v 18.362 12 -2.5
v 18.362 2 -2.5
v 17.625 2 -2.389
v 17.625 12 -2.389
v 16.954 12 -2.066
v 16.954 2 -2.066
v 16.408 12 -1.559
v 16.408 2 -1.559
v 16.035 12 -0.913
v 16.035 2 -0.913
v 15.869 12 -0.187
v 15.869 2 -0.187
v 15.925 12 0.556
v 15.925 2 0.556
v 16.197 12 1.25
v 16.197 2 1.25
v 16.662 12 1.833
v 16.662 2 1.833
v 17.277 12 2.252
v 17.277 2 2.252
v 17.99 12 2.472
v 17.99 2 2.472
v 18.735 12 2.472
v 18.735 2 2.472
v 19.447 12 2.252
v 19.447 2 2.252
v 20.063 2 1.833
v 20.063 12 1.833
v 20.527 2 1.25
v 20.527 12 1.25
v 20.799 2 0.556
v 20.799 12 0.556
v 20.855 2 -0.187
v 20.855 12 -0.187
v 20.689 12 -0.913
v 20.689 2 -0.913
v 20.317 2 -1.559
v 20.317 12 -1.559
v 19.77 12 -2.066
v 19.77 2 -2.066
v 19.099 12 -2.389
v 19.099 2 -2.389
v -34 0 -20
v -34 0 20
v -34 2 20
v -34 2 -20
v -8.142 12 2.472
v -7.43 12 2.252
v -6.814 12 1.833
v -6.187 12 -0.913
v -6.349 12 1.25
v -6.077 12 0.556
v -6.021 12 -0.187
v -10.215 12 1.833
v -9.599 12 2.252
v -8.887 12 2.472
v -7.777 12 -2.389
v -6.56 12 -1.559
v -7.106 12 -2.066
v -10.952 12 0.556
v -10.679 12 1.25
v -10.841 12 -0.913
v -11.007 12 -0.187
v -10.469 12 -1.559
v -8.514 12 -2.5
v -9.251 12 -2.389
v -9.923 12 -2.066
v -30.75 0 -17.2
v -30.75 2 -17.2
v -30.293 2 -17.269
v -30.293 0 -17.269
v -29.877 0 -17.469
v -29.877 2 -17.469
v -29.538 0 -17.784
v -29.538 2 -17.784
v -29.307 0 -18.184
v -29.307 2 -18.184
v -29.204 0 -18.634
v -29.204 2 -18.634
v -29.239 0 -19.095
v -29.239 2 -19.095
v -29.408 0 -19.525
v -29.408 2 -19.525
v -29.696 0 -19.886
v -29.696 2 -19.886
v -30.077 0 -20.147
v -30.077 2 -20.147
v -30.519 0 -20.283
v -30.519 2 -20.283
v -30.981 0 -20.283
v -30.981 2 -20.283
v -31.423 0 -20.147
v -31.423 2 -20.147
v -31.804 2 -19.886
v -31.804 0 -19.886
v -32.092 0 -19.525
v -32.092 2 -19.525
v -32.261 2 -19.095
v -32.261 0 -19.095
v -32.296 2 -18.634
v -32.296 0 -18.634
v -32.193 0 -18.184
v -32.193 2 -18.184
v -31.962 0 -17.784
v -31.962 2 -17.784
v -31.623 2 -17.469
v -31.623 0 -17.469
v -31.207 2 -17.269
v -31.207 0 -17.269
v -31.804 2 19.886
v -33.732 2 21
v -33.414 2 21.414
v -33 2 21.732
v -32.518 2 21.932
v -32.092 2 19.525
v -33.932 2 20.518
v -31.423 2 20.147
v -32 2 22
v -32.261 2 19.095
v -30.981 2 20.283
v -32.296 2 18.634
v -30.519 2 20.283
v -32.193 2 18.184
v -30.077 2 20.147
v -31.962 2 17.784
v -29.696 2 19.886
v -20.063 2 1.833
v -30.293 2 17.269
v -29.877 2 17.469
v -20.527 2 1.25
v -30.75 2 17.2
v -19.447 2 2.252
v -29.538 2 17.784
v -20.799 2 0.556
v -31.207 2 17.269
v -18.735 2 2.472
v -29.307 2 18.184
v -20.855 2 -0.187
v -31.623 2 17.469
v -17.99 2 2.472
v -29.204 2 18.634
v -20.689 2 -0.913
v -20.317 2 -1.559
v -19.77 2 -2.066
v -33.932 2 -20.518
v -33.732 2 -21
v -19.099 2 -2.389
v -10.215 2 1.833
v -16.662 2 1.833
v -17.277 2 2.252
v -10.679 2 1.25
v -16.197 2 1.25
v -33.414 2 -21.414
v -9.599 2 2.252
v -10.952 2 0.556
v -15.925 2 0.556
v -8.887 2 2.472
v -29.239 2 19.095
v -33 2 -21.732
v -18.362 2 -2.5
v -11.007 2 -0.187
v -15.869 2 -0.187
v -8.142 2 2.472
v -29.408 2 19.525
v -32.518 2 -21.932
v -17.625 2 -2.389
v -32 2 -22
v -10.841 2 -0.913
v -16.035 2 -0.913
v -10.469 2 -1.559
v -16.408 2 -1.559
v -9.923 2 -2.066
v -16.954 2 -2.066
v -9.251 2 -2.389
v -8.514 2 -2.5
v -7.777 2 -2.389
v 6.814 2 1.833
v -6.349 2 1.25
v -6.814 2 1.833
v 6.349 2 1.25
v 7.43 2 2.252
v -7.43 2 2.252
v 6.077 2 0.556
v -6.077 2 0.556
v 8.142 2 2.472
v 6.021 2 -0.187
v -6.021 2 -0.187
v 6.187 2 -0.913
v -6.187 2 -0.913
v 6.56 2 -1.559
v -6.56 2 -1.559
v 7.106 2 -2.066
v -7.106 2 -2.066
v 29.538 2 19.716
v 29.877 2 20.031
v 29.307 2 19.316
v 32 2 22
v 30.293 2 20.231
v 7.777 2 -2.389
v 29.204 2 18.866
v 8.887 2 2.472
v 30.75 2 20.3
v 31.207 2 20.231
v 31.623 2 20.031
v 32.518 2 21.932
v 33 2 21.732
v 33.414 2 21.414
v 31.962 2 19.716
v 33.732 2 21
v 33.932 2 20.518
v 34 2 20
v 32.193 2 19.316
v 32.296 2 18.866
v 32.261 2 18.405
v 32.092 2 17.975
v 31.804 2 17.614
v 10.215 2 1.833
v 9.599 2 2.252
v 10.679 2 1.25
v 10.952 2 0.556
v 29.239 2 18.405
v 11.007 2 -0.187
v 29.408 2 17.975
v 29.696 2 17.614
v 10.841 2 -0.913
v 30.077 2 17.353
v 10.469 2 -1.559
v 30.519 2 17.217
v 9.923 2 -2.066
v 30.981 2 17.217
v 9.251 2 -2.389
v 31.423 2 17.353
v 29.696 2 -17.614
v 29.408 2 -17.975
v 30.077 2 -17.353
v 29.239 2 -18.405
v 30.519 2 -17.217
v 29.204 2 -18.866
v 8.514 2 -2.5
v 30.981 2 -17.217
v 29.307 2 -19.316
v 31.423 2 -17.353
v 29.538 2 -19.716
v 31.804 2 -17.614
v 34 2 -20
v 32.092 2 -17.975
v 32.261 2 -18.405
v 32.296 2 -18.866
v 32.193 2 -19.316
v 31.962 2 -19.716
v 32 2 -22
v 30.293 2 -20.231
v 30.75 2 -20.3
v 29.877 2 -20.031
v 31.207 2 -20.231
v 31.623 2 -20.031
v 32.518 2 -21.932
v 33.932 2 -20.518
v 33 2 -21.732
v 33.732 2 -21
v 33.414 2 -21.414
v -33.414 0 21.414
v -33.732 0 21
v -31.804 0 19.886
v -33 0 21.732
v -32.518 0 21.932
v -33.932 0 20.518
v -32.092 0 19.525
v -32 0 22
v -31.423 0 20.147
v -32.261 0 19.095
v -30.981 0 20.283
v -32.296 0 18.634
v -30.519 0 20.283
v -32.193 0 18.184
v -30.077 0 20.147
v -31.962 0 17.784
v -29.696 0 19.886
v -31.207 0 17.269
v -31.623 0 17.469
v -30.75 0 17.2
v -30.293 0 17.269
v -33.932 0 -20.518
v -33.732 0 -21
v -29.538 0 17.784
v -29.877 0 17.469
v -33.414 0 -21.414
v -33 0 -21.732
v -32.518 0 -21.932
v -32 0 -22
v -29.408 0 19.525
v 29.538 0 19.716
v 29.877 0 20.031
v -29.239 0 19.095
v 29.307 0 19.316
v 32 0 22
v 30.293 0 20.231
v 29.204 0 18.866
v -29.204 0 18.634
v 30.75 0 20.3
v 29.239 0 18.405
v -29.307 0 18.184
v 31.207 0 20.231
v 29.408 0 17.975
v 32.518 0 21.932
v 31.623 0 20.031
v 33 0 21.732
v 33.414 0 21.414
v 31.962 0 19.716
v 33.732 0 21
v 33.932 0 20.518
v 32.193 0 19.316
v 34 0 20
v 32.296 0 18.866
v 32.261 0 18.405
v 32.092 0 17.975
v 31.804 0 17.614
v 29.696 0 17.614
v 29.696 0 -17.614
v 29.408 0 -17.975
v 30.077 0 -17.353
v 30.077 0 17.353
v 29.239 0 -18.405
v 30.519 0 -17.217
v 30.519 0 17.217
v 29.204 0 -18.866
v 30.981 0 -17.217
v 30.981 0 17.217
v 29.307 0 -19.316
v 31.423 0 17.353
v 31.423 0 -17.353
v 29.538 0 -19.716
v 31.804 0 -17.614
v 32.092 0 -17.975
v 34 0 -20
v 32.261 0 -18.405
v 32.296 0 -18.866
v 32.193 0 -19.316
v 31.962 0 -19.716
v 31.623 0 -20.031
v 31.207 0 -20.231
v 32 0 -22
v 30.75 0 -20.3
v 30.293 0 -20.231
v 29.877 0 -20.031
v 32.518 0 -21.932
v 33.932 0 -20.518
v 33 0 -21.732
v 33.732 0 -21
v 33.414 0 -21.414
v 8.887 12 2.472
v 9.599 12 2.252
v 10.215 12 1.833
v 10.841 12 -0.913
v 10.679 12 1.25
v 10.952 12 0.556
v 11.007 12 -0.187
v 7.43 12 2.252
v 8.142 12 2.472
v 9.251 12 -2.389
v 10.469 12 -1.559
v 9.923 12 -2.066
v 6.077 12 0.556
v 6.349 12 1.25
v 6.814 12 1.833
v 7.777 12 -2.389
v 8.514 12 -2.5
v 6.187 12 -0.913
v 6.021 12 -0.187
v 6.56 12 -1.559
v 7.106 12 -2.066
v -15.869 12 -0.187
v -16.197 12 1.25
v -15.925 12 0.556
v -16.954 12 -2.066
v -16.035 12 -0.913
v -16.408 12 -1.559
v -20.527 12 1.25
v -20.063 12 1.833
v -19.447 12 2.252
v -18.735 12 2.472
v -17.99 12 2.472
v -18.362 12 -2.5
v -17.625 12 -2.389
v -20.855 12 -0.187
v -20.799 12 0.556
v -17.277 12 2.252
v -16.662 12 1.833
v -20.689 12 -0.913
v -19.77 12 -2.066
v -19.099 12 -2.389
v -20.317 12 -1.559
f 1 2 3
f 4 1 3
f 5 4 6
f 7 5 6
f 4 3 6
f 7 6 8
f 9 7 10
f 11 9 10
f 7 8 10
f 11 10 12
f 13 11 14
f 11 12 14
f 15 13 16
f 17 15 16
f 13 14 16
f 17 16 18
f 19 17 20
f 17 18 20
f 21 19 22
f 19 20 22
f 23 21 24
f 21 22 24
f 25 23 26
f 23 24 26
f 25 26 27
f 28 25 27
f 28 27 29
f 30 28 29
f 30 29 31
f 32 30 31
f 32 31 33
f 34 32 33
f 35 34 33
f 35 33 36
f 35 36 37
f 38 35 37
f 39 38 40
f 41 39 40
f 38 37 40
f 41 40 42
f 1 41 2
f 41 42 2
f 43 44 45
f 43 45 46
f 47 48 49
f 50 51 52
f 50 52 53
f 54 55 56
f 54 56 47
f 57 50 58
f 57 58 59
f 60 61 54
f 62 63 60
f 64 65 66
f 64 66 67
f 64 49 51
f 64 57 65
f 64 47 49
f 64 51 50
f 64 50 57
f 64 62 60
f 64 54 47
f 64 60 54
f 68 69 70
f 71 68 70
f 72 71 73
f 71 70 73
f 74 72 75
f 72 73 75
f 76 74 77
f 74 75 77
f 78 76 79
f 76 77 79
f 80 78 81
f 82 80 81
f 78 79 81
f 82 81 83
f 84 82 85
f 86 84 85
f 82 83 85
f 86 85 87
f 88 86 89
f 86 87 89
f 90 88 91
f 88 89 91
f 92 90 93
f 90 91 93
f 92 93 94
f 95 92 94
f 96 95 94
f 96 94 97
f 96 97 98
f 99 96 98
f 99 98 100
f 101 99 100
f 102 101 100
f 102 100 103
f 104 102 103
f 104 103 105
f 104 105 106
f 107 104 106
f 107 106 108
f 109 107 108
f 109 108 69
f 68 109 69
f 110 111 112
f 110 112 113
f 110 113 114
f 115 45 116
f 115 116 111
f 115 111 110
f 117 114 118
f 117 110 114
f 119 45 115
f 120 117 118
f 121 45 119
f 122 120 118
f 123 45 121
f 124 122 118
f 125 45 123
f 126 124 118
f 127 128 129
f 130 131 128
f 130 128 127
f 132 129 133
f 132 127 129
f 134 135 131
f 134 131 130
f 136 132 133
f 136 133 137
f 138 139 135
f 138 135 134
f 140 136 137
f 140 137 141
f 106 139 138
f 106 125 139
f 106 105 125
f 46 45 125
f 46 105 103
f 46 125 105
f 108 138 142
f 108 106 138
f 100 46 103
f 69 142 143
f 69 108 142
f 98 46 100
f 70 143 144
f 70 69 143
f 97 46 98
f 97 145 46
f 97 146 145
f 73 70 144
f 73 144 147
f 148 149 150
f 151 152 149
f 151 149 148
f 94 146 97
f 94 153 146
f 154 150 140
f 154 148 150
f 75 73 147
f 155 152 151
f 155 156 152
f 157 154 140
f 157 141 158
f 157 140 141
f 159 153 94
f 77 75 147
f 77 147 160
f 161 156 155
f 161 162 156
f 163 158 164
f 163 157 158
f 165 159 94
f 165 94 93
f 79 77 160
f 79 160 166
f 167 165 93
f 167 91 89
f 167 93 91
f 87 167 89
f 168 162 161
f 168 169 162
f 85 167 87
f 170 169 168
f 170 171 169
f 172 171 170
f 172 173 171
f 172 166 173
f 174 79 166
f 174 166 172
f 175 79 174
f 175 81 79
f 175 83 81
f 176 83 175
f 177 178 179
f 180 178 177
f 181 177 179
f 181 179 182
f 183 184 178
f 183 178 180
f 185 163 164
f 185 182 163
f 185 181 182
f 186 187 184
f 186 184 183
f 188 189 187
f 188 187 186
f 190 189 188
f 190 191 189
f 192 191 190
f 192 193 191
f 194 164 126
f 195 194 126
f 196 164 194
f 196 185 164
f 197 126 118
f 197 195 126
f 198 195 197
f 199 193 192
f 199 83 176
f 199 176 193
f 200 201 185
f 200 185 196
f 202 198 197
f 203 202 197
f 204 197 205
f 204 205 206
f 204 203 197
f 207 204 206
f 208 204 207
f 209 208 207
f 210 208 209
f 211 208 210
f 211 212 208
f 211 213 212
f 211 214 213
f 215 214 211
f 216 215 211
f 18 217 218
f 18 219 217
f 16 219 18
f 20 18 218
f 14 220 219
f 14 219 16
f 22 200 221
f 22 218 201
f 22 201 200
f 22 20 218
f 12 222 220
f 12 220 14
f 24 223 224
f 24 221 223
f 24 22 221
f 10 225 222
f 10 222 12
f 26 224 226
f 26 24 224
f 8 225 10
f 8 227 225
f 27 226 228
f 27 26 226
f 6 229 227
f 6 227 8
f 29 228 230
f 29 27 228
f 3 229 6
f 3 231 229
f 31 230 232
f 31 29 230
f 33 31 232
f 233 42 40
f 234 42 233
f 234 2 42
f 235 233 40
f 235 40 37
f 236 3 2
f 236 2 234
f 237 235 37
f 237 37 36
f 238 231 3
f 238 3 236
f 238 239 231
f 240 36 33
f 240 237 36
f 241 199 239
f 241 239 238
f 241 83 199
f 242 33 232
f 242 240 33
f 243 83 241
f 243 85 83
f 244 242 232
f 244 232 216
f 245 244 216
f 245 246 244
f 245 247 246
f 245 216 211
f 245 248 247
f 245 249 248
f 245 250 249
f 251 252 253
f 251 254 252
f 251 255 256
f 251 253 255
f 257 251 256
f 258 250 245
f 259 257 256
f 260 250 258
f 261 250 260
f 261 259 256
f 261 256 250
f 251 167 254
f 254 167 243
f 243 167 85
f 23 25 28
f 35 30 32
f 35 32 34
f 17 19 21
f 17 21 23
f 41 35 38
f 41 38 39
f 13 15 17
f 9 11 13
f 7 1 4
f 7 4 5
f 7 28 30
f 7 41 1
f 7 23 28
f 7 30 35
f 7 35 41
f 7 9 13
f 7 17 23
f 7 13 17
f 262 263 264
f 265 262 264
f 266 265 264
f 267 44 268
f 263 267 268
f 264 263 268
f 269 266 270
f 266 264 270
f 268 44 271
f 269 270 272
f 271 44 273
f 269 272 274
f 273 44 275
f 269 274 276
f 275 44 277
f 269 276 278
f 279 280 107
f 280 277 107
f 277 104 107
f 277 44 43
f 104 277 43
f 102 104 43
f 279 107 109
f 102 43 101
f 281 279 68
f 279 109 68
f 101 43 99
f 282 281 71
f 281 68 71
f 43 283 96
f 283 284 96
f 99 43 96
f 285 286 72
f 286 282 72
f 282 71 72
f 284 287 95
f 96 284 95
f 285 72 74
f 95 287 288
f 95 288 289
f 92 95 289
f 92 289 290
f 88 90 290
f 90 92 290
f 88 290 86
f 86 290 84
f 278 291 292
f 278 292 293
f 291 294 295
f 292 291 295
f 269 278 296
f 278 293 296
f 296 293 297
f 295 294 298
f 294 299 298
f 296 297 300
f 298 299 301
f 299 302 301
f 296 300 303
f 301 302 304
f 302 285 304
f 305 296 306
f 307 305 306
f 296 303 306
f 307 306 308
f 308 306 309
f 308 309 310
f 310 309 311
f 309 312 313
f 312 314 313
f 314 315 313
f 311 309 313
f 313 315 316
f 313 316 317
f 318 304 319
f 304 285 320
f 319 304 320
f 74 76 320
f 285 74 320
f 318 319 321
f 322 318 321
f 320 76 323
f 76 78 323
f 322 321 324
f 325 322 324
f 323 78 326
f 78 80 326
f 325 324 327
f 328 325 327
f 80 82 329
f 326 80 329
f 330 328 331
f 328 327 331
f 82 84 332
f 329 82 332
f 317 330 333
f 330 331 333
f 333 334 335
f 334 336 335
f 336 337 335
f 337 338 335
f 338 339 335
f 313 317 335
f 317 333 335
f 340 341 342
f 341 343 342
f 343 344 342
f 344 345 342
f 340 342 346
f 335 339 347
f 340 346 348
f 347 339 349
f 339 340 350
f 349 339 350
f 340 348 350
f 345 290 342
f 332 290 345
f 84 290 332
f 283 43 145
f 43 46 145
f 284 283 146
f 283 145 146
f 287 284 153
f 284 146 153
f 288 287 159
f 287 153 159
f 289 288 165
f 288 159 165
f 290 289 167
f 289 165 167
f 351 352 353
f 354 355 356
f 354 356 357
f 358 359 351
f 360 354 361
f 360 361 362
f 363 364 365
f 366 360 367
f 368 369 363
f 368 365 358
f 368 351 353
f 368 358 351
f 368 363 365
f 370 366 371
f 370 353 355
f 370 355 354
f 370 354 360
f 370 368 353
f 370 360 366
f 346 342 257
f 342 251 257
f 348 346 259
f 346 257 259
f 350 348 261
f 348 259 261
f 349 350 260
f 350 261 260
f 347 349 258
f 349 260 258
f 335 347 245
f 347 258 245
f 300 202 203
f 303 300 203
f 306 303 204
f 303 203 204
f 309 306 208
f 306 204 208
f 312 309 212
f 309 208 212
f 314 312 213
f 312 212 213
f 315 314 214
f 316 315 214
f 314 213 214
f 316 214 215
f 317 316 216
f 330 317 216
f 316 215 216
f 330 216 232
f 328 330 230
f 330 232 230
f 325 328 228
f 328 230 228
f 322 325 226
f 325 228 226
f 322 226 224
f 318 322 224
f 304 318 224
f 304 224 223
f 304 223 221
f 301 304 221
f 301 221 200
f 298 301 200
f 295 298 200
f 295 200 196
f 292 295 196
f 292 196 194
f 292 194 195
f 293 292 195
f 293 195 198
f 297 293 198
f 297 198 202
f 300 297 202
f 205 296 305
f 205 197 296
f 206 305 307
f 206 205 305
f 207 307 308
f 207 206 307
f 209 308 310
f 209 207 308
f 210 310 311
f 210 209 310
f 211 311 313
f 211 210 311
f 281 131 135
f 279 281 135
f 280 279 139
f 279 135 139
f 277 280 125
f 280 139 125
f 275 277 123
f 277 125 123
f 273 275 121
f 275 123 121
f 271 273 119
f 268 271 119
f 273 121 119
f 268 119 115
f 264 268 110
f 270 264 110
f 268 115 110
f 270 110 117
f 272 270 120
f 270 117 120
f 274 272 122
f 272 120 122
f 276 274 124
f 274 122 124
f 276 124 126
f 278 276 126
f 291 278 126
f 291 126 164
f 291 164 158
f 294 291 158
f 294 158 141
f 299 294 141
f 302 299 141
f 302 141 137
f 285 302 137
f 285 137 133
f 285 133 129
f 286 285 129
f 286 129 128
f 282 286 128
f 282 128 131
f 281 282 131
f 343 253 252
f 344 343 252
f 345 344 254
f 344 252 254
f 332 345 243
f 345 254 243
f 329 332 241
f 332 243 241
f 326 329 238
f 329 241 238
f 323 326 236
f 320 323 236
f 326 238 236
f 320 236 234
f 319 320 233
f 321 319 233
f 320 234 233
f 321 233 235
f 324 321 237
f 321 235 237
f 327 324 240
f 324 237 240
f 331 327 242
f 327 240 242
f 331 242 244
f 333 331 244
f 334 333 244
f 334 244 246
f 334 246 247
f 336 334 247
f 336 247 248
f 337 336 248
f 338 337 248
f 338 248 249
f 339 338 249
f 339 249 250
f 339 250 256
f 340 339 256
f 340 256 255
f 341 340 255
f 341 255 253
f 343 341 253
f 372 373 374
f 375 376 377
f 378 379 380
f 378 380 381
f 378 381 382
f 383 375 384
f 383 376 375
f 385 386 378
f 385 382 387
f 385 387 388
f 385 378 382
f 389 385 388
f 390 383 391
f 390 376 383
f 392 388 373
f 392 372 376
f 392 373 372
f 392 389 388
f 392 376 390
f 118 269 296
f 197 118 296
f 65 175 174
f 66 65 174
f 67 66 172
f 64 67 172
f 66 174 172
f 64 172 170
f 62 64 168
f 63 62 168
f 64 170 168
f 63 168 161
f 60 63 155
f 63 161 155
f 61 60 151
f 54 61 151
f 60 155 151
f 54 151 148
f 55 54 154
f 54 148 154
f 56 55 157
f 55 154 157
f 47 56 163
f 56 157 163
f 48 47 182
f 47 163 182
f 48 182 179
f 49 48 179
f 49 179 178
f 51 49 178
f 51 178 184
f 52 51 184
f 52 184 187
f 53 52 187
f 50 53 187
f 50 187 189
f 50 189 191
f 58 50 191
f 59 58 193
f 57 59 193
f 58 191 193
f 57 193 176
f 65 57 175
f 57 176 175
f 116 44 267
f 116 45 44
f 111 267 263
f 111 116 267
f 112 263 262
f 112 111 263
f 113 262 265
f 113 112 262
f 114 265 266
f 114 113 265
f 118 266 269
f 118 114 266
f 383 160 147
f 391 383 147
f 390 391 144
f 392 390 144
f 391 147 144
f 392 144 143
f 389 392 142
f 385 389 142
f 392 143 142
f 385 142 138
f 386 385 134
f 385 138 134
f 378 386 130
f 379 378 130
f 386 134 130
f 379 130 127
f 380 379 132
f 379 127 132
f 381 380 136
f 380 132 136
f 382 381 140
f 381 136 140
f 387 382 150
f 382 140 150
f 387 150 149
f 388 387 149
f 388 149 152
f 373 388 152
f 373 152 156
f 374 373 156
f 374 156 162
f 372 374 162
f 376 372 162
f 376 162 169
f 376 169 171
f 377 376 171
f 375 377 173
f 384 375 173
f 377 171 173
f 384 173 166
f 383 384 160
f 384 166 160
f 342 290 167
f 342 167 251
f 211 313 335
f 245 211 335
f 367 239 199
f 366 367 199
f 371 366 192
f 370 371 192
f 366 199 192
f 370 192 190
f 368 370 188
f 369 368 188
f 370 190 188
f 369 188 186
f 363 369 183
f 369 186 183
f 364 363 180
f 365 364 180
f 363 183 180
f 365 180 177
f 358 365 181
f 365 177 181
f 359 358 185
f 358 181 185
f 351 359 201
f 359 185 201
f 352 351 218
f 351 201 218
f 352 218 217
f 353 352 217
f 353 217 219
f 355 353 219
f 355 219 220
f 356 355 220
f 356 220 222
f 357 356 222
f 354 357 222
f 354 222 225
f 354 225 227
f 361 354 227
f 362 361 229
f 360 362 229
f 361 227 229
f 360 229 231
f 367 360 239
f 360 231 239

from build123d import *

# Parameters (mm, degrees)
SKETCH_1_W          = 68
SKETCH_1_H          = 44
EXTRUDE_1_DEPTH     = 2
SKETCH_2_R          = 2.5
EXTRUDE_2_DEPTH     = 10
SKETCH_4_R          = 1.55
CUT_EXTRUDE_1_DEPTH = 42.713307229
FILLET_1_R          = 2


with BuildPart() as part:
    # 草图1 → 凸台-拉伸1 (new body)
    with BuildSketch(Plane(origin=(0, 0, 0), x_dir=(1, 0, 0), z_dir=(0, 1, 0))):
        Rectangle(SKETCH_1_W, SKETCH_1_H)
    extrude(amount=EXTRUDE_1_DEPTH)

    # 草图2 → 凸台-拉伸2 (add)
    with BuildSketch(Plane(origin=(0, 2, 0), x_dir=(1, 0, 0), z_dir=(0, 1, 0))):
        with Locations(Location((-18.362121931, 0, 0), (0, 0, 90))):
            Circle(SKETCH_2_R)
        with Locations(Location((-8.514245581, 0, 0), (0, 0, 90))):
            Circle(SKETCH_2_R)
        with Locations(Location((8.514245581, 0, 0), (0, 0, 90))):
            Circle(SKETCH_2_R)
        with Locations(Location((18.362121931, 0, 0), (0, 0, 90))):
            Circle(SKETCH_2_R)
    extrude(amount=EXTRUDE_2_DEPTH)

    # 草图4 → 切除-拉伸1 (cut, through all)
    with BuildSketch(Plane(origin=(0, 2, 0), x_dir=(1, 0, 0), z_dir=(0, 1, 0))):
        with Locations(Location((-30.75, 18.75, 0), (0, 0, 270))):
            Circle(SKETCH_4_R)
        with Locations(Location((-30.75, -18.75, 0), (0, 0, 90))):
            Circle(SKETCH_4_R)
        with Locations(Location((30.75, -18.75, 0), (0, 0, 270))):
            Circle(SKETCH_4_R)
        with Locations(Location((30.75, 18.75, 0), (0, 0, 90))):
            Circle(SKETCH_4_R)
    extrude(amount=-CUT_EXTRUDE_1_DEPTH, mode=Mode.SUBTRACT)

    # 圆角1
    fillet_1_edges = [part.edges().sort_by_distance(p)[0] for p in [
        (34, 1, 22),
        (-34, 1, 22),
        (-34, 1, -22),
        (34, 1, -22),
    ]]
    fillet(fillet_1_edges, radius=FILLET_1_R)


solid = part.part
